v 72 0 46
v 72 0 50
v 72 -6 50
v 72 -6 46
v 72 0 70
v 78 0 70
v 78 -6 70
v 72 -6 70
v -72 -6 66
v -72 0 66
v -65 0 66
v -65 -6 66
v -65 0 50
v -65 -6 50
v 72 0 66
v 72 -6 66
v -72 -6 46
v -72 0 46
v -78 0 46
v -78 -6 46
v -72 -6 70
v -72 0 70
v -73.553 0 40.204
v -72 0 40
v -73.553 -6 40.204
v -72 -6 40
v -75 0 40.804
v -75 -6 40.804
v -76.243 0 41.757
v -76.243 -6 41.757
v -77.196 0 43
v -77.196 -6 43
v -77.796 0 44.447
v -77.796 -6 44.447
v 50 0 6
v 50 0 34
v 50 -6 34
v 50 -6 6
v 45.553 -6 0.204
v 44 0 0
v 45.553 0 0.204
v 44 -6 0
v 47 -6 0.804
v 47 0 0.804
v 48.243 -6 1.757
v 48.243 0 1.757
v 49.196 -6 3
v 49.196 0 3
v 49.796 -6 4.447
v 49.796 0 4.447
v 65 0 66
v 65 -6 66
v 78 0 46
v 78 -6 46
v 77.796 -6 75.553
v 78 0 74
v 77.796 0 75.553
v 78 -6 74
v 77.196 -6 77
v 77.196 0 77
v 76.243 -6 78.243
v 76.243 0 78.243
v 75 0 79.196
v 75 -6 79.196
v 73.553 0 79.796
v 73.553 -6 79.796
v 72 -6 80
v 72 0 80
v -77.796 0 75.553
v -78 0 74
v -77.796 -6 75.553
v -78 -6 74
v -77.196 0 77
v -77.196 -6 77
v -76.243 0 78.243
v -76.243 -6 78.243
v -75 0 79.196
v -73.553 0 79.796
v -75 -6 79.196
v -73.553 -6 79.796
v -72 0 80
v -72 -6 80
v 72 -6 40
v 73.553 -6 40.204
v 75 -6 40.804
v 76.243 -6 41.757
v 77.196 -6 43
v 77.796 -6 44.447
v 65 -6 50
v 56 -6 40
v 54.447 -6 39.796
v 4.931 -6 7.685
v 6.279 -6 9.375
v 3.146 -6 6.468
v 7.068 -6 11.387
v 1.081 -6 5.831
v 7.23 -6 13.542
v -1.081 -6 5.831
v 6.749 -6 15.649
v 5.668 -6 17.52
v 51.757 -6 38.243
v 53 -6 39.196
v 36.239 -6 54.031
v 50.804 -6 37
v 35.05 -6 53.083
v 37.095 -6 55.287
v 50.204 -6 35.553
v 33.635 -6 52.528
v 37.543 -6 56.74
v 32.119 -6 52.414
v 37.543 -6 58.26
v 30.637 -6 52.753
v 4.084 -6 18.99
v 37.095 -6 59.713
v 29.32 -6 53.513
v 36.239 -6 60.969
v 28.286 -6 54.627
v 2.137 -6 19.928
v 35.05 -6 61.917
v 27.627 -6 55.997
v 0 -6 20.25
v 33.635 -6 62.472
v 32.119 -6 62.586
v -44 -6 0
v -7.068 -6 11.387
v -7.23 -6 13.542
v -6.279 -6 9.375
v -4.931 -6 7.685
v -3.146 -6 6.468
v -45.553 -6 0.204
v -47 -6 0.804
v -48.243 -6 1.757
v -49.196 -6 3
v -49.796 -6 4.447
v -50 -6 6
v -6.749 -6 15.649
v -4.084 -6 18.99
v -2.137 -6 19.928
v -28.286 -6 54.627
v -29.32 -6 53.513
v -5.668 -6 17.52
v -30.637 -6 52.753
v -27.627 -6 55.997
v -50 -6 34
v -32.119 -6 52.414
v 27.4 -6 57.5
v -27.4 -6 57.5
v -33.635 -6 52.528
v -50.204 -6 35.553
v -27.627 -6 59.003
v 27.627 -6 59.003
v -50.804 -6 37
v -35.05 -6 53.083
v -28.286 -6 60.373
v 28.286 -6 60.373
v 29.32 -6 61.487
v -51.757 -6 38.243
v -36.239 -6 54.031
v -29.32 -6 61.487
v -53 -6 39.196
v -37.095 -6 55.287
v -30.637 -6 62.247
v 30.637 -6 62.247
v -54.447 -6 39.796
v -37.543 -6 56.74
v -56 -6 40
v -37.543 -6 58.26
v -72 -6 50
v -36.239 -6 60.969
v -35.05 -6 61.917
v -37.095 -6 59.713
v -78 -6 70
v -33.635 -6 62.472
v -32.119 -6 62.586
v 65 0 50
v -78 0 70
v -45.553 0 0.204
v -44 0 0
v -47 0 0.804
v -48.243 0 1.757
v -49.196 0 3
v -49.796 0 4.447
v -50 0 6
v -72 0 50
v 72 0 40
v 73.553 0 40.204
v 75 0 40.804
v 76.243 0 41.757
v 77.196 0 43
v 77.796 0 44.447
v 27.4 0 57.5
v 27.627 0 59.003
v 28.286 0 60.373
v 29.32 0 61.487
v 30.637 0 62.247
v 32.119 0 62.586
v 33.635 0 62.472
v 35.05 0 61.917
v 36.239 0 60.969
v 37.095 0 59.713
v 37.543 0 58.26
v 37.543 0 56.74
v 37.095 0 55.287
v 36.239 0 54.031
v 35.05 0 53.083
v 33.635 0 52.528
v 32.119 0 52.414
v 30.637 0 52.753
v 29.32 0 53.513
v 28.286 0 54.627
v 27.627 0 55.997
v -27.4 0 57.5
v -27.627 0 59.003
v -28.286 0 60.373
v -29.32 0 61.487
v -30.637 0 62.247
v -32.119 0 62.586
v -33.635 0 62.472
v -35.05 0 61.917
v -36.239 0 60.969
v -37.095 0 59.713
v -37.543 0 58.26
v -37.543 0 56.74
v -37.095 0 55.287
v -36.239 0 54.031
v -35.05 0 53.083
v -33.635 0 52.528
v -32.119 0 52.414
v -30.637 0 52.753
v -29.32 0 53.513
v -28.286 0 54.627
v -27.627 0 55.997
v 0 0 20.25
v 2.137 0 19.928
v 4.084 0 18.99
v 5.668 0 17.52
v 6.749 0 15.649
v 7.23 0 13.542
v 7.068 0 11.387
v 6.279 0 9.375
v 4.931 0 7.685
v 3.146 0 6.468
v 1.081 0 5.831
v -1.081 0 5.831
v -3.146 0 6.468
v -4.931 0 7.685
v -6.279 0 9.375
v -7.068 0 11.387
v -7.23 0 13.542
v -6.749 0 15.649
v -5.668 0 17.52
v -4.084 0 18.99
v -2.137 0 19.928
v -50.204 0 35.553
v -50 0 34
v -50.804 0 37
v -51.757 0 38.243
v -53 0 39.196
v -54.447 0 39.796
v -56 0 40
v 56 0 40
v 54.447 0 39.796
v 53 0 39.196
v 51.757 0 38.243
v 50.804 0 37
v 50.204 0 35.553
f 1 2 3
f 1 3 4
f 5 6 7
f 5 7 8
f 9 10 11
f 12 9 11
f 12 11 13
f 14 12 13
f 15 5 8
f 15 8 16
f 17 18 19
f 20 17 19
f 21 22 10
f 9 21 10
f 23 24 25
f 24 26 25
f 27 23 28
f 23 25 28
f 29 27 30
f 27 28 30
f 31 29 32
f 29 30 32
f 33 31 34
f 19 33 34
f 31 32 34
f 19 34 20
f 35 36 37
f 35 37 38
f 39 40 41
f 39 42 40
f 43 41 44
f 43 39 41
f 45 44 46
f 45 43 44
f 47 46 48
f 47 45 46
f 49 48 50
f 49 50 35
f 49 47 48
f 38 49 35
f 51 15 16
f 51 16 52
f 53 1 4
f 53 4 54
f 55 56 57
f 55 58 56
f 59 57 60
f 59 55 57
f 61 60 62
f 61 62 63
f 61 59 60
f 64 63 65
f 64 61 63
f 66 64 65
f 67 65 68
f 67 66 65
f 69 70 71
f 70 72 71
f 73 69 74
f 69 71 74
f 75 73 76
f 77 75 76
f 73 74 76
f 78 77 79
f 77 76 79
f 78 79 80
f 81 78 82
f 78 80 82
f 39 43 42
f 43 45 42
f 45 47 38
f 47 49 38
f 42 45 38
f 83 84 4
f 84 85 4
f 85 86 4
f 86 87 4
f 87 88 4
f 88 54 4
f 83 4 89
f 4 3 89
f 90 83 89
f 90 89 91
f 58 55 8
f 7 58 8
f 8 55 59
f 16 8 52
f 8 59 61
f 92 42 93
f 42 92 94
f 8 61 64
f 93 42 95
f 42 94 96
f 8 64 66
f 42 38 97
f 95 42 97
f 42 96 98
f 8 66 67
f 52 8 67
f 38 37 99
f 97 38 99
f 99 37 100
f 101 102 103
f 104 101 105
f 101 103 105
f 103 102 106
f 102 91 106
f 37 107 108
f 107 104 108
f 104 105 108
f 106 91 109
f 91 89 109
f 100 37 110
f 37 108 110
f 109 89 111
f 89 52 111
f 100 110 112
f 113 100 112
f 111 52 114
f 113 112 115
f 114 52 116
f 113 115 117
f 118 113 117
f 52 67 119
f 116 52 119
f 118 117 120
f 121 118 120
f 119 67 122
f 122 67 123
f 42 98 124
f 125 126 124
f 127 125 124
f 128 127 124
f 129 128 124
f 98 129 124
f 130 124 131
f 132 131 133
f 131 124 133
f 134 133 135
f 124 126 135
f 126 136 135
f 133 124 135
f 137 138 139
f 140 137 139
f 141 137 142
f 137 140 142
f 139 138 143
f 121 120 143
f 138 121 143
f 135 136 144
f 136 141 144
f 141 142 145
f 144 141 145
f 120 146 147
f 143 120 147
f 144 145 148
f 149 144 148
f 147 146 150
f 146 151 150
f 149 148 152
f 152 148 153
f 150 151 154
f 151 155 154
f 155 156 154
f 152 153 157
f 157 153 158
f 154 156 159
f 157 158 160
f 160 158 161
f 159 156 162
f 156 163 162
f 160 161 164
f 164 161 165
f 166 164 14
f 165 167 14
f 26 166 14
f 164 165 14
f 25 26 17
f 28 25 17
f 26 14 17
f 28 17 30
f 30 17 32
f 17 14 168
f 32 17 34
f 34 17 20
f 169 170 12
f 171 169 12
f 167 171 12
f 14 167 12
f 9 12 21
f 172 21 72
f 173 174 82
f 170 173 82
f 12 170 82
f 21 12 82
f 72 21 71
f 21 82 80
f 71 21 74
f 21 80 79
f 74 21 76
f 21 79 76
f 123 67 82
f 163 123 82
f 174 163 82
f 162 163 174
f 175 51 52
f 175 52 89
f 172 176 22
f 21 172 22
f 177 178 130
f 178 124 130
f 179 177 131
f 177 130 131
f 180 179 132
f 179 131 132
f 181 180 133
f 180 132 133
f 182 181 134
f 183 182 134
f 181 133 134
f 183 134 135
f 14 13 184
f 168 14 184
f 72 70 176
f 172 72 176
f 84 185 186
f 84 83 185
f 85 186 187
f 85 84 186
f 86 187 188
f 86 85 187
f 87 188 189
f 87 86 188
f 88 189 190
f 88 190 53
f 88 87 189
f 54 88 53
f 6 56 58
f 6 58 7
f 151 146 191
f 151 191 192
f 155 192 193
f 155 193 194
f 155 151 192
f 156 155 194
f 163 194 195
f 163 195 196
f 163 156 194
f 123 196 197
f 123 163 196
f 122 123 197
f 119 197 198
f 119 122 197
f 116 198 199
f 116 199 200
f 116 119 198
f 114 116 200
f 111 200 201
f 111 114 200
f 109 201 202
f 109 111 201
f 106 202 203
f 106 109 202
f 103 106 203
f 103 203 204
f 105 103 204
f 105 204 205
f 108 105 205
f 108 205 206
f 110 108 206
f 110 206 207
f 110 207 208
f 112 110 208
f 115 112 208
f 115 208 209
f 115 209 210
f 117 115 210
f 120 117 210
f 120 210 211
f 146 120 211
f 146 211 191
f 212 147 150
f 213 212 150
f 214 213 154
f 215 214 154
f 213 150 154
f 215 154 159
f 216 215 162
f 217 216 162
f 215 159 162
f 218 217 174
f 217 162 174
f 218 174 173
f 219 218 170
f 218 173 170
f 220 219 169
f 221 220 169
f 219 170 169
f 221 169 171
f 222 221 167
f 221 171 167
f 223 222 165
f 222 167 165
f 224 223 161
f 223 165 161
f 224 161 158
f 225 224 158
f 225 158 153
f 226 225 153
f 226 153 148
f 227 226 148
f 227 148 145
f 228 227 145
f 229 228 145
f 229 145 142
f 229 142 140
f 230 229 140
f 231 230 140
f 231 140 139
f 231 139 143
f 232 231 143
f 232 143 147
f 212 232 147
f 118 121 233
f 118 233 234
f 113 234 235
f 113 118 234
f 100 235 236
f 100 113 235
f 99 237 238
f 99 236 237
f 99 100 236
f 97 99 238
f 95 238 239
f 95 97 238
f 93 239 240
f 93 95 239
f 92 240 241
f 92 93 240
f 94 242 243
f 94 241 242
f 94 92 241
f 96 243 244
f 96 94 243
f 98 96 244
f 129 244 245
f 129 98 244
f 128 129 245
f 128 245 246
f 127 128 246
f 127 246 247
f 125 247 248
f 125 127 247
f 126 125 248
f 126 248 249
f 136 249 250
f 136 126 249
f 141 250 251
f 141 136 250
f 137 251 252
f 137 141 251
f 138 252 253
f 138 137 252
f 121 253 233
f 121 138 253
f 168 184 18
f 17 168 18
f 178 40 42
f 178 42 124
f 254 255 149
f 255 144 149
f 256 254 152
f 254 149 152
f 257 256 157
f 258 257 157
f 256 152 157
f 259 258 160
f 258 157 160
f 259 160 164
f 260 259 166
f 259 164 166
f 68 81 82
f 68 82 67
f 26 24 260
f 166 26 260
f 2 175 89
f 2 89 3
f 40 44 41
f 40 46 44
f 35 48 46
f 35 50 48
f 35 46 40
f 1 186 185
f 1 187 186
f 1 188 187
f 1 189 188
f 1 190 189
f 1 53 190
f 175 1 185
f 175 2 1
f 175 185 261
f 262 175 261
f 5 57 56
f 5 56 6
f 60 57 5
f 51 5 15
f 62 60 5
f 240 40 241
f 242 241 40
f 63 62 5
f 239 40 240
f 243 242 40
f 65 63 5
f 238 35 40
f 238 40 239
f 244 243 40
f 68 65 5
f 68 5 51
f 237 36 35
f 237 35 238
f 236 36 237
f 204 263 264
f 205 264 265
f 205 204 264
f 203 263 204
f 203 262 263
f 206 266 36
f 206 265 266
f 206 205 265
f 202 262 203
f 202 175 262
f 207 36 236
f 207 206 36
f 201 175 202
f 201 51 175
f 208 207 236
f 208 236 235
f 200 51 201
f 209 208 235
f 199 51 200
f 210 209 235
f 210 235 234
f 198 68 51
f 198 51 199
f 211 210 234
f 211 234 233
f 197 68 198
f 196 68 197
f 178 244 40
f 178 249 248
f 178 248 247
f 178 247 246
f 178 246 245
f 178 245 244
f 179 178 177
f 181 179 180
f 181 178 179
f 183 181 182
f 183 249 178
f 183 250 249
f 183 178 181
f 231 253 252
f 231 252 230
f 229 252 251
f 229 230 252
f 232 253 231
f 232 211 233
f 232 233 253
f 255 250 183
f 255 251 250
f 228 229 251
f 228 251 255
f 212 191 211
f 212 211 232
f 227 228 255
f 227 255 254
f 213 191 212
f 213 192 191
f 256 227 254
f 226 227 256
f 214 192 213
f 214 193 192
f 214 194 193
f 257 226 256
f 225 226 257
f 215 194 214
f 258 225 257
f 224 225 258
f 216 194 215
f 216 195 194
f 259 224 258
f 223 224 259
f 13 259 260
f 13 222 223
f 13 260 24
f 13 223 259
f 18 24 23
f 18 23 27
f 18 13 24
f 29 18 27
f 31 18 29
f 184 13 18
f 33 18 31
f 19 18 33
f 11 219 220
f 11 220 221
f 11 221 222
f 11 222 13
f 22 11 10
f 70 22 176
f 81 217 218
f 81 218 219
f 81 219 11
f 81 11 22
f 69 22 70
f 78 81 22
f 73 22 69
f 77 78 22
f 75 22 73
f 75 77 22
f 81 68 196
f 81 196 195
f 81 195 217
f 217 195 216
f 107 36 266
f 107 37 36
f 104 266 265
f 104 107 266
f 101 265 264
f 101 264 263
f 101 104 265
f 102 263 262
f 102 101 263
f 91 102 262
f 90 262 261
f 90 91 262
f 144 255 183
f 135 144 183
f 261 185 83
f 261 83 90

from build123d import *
from build123d import SkipClean  # not in build123d's __all__

# Parameters (mm, degrees)
F1_DEPTH = 6
F2_R     = 5.1
F3_DEPTH = 25
F5_DEPTH = 25
F6_R     = 5.99999
F8_R     = 6


# Not quite as in the source:
# - a fillet or chamfer is up to 0.001 mm smaller than in the source, because OpenCascade refuses the exact size


with BuildPart() as f1:
    # F0 (on Front) → F1 (new body)
    with BuildSketch(Plane.XZ):
        Polygon((-50, 0), (0, 0), (0, 80), (-78, 80), (-78, 70), (-72, 70), (-72, 66), (-65, 66), (-65, 50), (-72, 50), (-72, 46), (-78, 46), (-78, 40), (-50, 40), align=None)
    extrude(amount=F1_DEPTH)

    # F2 (on face) → F3 (cut)
    with BuildSketch(Plane.XZ.offset(6)):
        with Locations((-32.5, 57.5)):
            Circle(F2_R)
    extrude(amount=-F3_DEPTH, mode=Mode.SUBTRACT)

    # F4 (on face) → F5 (cut)
    with BuildSketch(Plane.XZ.offset(6)):
        with BuildLine():
            Line((0, 5.75), (0, 20.25))
            ThreePointArc((0, 20.25), (-7.25, 13), (0, 5.75))
        make_face()
    extrude(amount=-F5_DEPTH, mode=Mode.SUBTRACT)

    # F6 (radius 6 in the source; OpenCascade refuses exactly that, so slightly less here)
    f6_edges = [f1.edges().sort_by_distance(p)[0] for p in [
        (-78, -3, 80),
        (-78, -3, 40),
        (-50, -3, 0),
    ]]
    fillet(f6_edges, radius=F6_R)

    # F7: F1 across face


with BuildPart() as f1_1:
    add(f1.part, clean=False)
    with SkipClean():  # cleaning this boolean's faces spoils the solid; the shape is the same uncleaned
        add(f1.part.mirror(Plane(origin=(0, -3, 50.125), x_dir=(0, 1, 0), z_dir=(1, 0, 0))), clean=False)

    # F8
    f8_edges = [f1_1.edges().sort_by_distance(p)[0] for p in [
        (-50, -3, 40),
        (50, -3, 40),
    ]]
    fillet(f8_edges, radius=F8_R)


solid = f1_1.part
